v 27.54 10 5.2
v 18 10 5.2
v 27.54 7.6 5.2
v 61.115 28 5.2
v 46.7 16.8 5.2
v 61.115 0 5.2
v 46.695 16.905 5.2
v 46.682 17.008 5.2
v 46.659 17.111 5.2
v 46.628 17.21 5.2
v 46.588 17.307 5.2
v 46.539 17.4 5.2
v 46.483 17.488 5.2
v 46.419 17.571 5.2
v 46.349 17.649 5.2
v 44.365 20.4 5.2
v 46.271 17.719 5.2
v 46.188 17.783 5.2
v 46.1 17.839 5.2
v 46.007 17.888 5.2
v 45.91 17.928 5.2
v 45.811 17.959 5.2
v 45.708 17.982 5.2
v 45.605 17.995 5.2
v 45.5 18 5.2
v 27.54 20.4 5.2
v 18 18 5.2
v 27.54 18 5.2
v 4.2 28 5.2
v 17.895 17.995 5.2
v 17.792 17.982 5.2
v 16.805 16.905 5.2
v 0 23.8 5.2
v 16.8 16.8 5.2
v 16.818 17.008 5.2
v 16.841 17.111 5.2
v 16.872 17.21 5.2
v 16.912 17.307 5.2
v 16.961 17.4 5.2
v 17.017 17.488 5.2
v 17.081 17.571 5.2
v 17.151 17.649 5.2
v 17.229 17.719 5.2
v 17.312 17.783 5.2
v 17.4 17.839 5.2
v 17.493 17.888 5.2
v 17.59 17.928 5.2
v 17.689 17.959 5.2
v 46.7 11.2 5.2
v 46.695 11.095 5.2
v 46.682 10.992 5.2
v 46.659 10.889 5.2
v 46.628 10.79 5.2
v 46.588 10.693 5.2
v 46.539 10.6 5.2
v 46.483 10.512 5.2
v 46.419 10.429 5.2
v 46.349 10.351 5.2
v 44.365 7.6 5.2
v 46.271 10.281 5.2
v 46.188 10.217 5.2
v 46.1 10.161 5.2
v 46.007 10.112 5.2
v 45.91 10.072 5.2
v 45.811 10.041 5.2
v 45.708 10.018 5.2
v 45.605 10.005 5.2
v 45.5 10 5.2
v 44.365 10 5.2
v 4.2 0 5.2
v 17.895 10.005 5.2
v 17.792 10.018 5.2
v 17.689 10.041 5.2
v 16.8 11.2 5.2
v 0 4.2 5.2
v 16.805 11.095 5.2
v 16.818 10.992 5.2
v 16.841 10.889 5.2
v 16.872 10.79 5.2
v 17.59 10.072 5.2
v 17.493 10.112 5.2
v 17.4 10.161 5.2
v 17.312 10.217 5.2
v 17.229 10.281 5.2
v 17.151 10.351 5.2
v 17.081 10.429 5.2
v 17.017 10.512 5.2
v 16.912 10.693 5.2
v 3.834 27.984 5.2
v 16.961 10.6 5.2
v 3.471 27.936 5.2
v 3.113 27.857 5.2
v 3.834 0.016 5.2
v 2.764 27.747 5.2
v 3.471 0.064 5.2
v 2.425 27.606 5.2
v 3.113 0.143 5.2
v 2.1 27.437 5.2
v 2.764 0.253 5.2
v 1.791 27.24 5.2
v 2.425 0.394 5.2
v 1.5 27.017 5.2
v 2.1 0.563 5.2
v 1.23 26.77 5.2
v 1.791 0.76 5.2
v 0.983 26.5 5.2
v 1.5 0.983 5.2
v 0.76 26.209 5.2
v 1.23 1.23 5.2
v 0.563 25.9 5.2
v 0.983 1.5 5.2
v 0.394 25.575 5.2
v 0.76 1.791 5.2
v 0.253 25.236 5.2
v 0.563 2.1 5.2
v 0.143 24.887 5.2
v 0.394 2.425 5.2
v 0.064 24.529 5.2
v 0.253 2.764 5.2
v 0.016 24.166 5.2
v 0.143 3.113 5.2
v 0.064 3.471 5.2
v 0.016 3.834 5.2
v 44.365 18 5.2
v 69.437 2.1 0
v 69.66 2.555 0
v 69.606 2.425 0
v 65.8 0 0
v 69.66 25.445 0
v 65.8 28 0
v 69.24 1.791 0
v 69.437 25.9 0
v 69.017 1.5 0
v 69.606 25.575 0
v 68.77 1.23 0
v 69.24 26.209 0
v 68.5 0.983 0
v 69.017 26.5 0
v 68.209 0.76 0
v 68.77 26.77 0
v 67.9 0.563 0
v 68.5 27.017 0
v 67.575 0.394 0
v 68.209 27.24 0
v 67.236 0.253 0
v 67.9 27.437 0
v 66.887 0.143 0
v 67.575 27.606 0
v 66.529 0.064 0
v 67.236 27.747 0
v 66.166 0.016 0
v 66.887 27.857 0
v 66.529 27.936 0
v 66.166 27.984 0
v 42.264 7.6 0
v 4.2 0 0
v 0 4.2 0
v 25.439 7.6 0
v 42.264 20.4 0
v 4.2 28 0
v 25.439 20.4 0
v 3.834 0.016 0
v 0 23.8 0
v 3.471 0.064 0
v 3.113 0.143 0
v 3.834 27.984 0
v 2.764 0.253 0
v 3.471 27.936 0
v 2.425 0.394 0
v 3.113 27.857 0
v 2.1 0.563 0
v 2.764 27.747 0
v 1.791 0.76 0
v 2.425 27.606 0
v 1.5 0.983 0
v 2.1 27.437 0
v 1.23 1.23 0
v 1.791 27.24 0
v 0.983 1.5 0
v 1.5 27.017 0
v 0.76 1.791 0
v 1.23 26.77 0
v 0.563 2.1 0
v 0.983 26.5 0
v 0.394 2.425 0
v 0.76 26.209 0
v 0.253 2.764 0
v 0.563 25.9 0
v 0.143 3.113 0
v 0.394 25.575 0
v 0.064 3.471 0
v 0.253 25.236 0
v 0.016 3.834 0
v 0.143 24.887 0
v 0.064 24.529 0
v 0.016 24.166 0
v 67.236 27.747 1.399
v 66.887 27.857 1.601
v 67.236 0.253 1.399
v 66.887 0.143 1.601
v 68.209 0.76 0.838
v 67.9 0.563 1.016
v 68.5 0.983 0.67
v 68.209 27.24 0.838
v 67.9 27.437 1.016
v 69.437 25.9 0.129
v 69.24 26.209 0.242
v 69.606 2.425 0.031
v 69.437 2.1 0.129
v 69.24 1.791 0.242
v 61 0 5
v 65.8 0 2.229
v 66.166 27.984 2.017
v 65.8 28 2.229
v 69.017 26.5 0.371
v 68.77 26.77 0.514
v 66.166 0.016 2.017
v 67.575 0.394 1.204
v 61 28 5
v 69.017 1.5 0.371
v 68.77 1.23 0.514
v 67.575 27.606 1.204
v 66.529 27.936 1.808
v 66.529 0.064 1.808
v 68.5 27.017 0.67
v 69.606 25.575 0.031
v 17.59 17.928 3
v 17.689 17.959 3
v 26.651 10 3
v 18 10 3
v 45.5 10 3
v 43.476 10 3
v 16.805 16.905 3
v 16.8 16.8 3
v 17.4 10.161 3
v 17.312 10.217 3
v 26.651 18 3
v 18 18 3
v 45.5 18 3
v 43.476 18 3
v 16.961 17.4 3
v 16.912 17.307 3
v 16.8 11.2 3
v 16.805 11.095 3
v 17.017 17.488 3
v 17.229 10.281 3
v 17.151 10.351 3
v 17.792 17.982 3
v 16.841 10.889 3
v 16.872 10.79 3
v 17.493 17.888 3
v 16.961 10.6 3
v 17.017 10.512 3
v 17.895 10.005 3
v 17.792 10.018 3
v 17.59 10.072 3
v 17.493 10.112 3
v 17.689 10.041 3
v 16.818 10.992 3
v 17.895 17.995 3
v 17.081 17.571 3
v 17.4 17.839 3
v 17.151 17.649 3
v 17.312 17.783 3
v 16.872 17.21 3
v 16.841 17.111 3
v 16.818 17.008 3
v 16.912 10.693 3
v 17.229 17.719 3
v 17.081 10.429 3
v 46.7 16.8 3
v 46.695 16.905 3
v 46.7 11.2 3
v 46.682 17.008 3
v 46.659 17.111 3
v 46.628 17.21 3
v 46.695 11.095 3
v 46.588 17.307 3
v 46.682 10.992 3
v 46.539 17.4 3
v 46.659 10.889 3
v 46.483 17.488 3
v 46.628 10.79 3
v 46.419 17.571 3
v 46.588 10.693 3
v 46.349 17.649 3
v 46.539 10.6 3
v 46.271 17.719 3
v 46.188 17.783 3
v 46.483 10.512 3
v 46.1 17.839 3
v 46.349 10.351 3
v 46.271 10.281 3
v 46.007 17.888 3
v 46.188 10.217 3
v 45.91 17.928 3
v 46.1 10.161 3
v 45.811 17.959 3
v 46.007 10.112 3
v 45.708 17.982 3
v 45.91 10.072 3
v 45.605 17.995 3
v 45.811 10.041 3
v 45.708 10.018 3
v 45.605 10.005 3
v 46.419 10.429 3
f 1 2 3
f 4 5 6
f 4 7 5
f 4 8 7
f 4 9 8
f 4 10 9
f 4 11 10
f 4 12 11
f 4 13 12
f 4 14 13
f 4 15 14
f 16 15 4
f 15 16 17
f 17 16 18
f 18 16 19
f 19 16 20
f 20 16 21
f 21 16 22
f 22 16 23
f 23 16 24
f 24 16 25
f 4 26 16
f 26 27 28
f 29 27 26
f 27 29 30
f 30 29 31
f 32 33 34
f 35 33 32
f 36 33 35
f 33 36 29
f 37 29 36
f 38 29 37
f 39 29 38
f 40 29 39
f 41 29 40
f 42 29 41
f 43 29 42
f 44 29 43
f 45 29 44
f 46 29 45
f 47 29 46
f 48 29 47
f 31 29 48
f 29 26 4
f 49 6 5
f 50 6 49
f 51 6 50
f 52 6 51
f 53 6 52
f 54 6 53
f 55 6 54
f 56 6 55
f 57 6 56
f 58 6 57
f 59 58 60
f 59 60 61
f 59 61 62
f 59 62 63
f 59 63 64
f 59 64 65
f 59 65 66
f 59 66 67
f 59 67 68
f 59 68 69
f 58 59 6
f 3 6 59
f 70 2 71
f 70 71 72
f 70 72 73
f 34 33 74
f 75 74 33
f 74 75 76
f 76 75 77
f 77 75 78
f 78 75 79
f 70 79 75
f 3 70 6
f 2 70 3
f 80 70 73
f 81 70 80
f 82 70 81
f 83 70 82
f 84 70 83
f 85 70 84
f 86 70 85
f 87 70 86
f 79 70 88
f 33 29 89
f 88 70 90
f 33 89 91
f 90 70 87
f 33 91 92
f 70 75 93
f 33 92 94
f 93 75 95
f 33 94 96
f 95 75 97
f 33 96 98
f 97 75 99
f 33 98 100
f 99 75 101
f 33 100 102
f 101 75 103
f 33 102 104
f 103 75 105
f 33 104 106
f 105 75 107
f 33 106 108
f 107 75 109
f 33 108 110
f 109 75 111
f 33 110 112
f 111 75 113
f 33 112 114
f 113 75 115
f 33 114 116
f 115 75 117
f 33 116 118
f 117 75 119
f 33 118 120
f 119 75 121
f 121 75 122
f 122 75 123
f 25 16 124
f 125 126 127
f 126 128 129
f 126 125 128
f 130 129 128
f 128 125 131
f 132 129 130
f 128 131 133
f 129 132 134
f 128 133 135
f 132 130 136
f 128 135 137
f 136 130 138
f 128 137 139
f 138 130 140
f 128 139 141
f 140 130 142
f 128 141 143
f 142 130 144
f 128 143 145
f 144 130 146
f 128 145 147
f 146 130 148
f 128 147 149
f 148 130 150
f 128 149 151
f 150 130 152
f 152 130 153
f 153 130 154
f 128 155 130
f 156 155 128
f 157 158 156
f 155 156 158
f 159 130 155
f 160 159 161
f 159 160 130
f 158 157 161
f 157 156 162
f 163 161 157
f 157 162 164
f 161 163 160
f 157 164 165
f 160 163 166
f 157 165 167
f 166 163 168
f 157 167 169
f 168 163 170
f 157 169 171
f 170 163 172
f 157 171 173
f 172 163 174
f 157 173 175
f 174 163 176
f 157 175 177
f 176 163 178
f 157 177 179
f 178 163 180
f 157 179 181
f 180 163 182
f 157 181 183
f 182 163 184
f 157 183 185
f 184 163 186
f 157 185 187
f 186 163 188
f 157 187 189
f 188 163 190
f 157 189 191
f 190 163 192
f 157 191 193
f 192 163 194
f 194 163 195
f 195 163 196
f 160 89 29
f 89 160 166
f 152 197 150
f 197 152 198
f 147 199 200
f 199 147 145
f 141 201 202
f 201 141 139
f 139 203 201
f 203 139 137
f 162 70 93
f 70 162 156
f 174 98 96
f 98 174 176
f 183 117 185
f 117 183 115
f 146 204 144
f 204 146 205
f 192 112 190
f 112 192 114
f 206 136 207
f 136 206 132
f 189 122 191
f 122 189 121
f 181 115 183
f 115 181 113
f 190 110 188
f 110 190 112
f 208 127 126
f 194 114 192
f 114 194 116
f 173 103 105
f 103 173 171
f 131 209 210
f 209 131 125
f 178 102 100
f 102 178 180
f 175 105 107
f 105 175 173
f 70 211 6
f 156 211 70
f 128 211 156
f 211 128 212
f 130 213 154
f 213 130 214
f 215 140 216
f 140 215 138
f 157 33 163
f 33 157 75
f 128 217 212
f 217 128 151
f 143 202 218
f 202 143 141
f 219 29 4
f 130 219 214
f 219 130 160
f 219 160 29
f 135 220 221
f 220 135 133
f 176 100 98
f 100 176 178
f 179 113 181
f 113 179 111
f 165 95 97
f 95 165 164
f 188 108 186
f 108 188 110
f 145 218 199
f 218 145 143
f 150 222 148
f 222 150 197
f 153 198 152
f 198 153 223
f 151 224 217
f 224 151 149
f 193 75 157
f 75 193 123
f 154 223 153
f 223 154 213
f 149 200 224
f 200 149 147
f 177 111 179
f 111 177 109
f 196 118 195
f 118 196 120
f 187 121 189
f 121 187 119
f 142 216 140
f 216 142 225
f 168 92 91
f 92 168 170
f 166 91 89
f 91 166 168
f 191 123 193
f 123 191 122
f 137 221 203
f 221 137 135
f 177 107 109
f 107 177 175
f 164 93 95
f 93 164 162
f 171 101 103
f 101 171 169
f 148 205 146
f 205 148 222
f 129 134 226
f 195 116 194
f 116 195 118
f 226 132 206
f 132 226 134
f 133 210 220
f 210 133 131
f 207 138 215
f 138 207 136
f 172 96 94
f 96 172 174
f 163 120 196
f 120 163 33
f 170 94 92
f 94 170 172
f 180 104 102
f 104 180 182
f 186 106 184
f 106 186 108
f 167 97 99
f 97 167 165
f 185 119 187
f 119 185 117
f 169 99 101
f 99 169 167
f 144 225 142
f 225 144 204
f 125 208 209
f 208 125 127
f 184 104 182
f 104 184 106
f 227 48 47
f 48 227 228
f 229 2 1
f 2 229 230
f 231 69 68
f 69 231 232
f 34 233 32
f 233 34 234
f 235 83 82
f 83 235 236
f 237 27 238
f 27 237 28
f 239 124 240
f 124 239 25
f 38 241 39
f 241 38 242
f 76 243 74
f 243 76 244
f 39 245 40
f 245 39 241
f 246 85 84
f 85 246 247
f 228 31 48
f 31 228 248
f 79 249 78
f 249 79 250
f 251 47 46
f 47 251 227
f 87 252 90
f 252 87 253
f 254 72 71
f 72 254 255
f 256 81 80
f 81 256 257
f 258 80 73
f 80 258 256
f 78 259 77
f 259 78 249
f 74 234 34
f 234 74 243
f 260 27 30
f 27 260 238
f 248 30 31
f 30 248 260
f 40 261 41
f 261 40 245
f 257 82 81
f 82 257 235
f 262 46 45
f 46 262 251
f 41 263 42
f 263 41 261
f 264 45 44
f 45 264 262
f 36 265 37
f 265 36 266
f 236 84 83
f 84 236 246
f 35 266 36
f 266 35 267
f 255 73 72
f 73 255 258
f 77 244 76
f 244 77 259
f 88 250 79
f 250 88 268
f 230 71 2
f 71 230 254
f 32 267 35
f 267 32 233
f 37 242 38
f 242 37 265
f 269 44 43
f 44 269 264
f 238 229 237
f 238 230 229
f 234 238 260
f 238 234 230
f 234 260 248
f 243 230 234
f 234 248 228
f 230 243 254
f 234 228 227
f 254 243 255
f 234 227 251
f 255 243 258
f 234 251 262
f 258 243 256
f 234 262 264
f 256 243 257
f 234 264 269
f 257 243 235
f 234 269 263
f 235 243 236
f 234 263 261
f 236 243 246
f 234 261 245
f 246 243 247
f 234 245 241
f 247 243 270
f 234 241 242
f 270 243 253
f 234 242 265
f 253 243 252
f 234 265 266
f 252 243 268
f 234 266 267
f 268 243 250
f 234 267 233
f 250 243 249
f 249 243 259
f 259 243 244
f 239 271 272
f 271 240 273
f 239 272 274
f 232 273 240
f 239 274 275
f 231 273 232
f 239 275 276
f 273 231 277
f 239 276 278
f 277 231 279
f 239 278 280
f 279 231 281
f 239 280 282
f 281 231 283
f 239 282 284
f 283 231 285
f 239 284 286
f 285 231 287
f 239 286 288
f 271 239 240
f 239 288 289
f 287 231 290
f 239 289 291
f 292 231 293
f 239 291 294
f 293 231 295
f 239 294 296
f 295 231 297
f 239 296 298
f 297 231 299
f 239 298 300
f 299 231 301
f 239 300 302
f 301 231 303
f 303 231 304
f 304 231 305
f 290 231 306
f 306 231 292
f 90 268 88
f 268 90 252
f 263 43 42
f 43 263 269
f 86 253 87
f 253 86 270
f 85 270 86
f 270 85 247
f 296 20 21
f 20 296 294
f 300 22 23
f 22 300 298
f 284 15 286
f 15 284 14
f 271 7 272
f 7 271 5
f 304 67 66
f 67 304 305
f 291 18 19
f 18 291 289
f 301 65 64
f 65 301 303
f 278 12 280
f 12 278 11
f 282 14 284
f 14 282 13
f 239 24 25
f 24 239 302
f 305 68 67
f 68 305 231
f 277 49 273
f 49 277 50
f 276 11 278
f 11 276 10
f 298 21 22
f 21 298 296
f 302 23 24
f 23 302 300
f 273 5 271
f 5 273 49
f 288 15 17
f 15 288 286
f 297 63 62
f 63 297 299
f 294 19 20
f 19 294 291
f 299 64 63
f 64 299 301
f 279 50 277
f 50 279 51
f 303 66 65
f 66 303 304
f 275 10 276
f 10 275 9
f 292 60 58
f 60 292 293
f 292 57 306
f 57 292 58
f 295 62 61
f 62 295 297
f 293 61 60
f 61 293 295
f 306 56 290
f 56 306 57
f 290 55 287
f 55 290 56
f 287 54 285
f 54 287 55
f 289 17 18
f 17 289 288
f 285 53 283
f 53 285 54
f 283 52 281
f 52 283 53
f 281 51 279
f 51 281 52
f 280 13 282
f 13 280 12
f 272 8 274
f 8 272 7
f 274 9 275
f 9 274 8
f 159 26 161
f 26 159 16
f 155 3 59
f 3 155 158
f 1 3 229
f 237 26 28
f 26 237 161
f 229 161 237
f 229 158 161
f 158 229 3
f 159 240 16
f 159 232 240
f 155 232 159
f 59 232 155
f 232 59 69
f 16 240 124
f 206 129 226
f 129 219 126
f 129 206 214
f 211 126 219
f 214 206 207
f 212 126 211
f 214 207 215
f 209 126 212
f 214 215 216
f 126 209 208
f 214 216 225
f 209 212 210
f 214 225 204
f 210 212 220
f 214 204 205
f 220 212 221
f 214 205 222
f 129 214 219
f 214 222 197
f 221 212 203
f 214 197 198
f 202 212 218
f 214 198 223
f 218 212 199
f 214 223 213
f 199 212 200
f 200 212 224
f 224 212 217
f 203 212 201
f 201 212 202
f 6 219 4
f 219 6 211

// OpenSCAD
// Pocket Stand Keychain - Minimal
// Parametric OpenSCAD design focused on portability, printability and clean style.

$fn = 72;

// ---------- Main parameters ----------
body_len    = 70;
body_w      = 28;
body_h      = 5.2;
corner_r    = 4.2;

slot_width  = 12.8; // fit for most phones with slim-medium cases
slot_depth  = 18.0;
slot_angle  = 68;   // visual angle balance (portrait + landscape)
slot_base_z = 1.1;  // keeps enough material under slot

lip_h       = 2.2;  // front anti-slip lip height
lip_t       = 1.6;

ring_hole_d = 5.0;
ring_pad_d  = 11.5;
ring_off_x  = 8.0;

light_cut_w = 8.0;
light_cut_l = 18.0;
light_cut_z = 2.2;

// ---------- Helpers ----------
module rounded_block(len, wid, hei, rad) {
    hull() {
        for (x = [rad, len - rad])
            for (y = [rad, wid - rad])
                translate([x, y, 0]) cylinder(h = hei, r = rad);
    }
}

module slot_cutter() {
    // Rotated rectangular prism to create the support slot.
    translate([body_len * 0.53, body_w / 2, slot_base_z])
        rotate([0, -slot_angle, 0])
            translate([-slot_depth / 2, -slot_width / 2, -body_h])
                cube([slot_depth, slot_width, body_h * 3]);
}

module front_lip() {
    // Front lip stops the phone from sliding down.
    translate([body_len * 0.73, (body_w - slot_width) / 2, body_h - lip_h])
        cube([lip_t, slot_width, lip_h]);
}

module lightening_cuts() {
    // Two internal cuts keep the look minimal and reduce weight.
    for (x = [body_len * 0.24, body_len * 0.41])
        translate([x, (body_w - light_cut_w) / 2, body_h - light_cut_z])
            rounded_block(light_cut_l, light_cut_w, light_cut_z + 0.1, 1.2);
}

module keyring_zone() {
    // Reinforced keyring mount integrated into the body silhouette.
    translate([ring_off_x, body_w / 2, 0])
        difference() {
            cylinder(h = body_h, d = ring_pad_d);
            translate([0, 0, -0.1]) cylinder(h = body_h + 0.2, d = ring_hole_d);
        }
}

// ---------- Final model ----------
module model() {
    difference() {
        union() {
            rounded_block(body_len, body_w, body_h, corner_r);
            keyring_zone();
            front_lip();
        }

        slot_cutter();
        lightening_cuts();

        // Palm comfort chamfer near tail (simple angled cut).
        translate([body_len - 9, -1, body_h - 0.2])
            rotate([0, 30, 0])
                cube([18, body_w + 2, body_h * 2]);
    }
}

model();
